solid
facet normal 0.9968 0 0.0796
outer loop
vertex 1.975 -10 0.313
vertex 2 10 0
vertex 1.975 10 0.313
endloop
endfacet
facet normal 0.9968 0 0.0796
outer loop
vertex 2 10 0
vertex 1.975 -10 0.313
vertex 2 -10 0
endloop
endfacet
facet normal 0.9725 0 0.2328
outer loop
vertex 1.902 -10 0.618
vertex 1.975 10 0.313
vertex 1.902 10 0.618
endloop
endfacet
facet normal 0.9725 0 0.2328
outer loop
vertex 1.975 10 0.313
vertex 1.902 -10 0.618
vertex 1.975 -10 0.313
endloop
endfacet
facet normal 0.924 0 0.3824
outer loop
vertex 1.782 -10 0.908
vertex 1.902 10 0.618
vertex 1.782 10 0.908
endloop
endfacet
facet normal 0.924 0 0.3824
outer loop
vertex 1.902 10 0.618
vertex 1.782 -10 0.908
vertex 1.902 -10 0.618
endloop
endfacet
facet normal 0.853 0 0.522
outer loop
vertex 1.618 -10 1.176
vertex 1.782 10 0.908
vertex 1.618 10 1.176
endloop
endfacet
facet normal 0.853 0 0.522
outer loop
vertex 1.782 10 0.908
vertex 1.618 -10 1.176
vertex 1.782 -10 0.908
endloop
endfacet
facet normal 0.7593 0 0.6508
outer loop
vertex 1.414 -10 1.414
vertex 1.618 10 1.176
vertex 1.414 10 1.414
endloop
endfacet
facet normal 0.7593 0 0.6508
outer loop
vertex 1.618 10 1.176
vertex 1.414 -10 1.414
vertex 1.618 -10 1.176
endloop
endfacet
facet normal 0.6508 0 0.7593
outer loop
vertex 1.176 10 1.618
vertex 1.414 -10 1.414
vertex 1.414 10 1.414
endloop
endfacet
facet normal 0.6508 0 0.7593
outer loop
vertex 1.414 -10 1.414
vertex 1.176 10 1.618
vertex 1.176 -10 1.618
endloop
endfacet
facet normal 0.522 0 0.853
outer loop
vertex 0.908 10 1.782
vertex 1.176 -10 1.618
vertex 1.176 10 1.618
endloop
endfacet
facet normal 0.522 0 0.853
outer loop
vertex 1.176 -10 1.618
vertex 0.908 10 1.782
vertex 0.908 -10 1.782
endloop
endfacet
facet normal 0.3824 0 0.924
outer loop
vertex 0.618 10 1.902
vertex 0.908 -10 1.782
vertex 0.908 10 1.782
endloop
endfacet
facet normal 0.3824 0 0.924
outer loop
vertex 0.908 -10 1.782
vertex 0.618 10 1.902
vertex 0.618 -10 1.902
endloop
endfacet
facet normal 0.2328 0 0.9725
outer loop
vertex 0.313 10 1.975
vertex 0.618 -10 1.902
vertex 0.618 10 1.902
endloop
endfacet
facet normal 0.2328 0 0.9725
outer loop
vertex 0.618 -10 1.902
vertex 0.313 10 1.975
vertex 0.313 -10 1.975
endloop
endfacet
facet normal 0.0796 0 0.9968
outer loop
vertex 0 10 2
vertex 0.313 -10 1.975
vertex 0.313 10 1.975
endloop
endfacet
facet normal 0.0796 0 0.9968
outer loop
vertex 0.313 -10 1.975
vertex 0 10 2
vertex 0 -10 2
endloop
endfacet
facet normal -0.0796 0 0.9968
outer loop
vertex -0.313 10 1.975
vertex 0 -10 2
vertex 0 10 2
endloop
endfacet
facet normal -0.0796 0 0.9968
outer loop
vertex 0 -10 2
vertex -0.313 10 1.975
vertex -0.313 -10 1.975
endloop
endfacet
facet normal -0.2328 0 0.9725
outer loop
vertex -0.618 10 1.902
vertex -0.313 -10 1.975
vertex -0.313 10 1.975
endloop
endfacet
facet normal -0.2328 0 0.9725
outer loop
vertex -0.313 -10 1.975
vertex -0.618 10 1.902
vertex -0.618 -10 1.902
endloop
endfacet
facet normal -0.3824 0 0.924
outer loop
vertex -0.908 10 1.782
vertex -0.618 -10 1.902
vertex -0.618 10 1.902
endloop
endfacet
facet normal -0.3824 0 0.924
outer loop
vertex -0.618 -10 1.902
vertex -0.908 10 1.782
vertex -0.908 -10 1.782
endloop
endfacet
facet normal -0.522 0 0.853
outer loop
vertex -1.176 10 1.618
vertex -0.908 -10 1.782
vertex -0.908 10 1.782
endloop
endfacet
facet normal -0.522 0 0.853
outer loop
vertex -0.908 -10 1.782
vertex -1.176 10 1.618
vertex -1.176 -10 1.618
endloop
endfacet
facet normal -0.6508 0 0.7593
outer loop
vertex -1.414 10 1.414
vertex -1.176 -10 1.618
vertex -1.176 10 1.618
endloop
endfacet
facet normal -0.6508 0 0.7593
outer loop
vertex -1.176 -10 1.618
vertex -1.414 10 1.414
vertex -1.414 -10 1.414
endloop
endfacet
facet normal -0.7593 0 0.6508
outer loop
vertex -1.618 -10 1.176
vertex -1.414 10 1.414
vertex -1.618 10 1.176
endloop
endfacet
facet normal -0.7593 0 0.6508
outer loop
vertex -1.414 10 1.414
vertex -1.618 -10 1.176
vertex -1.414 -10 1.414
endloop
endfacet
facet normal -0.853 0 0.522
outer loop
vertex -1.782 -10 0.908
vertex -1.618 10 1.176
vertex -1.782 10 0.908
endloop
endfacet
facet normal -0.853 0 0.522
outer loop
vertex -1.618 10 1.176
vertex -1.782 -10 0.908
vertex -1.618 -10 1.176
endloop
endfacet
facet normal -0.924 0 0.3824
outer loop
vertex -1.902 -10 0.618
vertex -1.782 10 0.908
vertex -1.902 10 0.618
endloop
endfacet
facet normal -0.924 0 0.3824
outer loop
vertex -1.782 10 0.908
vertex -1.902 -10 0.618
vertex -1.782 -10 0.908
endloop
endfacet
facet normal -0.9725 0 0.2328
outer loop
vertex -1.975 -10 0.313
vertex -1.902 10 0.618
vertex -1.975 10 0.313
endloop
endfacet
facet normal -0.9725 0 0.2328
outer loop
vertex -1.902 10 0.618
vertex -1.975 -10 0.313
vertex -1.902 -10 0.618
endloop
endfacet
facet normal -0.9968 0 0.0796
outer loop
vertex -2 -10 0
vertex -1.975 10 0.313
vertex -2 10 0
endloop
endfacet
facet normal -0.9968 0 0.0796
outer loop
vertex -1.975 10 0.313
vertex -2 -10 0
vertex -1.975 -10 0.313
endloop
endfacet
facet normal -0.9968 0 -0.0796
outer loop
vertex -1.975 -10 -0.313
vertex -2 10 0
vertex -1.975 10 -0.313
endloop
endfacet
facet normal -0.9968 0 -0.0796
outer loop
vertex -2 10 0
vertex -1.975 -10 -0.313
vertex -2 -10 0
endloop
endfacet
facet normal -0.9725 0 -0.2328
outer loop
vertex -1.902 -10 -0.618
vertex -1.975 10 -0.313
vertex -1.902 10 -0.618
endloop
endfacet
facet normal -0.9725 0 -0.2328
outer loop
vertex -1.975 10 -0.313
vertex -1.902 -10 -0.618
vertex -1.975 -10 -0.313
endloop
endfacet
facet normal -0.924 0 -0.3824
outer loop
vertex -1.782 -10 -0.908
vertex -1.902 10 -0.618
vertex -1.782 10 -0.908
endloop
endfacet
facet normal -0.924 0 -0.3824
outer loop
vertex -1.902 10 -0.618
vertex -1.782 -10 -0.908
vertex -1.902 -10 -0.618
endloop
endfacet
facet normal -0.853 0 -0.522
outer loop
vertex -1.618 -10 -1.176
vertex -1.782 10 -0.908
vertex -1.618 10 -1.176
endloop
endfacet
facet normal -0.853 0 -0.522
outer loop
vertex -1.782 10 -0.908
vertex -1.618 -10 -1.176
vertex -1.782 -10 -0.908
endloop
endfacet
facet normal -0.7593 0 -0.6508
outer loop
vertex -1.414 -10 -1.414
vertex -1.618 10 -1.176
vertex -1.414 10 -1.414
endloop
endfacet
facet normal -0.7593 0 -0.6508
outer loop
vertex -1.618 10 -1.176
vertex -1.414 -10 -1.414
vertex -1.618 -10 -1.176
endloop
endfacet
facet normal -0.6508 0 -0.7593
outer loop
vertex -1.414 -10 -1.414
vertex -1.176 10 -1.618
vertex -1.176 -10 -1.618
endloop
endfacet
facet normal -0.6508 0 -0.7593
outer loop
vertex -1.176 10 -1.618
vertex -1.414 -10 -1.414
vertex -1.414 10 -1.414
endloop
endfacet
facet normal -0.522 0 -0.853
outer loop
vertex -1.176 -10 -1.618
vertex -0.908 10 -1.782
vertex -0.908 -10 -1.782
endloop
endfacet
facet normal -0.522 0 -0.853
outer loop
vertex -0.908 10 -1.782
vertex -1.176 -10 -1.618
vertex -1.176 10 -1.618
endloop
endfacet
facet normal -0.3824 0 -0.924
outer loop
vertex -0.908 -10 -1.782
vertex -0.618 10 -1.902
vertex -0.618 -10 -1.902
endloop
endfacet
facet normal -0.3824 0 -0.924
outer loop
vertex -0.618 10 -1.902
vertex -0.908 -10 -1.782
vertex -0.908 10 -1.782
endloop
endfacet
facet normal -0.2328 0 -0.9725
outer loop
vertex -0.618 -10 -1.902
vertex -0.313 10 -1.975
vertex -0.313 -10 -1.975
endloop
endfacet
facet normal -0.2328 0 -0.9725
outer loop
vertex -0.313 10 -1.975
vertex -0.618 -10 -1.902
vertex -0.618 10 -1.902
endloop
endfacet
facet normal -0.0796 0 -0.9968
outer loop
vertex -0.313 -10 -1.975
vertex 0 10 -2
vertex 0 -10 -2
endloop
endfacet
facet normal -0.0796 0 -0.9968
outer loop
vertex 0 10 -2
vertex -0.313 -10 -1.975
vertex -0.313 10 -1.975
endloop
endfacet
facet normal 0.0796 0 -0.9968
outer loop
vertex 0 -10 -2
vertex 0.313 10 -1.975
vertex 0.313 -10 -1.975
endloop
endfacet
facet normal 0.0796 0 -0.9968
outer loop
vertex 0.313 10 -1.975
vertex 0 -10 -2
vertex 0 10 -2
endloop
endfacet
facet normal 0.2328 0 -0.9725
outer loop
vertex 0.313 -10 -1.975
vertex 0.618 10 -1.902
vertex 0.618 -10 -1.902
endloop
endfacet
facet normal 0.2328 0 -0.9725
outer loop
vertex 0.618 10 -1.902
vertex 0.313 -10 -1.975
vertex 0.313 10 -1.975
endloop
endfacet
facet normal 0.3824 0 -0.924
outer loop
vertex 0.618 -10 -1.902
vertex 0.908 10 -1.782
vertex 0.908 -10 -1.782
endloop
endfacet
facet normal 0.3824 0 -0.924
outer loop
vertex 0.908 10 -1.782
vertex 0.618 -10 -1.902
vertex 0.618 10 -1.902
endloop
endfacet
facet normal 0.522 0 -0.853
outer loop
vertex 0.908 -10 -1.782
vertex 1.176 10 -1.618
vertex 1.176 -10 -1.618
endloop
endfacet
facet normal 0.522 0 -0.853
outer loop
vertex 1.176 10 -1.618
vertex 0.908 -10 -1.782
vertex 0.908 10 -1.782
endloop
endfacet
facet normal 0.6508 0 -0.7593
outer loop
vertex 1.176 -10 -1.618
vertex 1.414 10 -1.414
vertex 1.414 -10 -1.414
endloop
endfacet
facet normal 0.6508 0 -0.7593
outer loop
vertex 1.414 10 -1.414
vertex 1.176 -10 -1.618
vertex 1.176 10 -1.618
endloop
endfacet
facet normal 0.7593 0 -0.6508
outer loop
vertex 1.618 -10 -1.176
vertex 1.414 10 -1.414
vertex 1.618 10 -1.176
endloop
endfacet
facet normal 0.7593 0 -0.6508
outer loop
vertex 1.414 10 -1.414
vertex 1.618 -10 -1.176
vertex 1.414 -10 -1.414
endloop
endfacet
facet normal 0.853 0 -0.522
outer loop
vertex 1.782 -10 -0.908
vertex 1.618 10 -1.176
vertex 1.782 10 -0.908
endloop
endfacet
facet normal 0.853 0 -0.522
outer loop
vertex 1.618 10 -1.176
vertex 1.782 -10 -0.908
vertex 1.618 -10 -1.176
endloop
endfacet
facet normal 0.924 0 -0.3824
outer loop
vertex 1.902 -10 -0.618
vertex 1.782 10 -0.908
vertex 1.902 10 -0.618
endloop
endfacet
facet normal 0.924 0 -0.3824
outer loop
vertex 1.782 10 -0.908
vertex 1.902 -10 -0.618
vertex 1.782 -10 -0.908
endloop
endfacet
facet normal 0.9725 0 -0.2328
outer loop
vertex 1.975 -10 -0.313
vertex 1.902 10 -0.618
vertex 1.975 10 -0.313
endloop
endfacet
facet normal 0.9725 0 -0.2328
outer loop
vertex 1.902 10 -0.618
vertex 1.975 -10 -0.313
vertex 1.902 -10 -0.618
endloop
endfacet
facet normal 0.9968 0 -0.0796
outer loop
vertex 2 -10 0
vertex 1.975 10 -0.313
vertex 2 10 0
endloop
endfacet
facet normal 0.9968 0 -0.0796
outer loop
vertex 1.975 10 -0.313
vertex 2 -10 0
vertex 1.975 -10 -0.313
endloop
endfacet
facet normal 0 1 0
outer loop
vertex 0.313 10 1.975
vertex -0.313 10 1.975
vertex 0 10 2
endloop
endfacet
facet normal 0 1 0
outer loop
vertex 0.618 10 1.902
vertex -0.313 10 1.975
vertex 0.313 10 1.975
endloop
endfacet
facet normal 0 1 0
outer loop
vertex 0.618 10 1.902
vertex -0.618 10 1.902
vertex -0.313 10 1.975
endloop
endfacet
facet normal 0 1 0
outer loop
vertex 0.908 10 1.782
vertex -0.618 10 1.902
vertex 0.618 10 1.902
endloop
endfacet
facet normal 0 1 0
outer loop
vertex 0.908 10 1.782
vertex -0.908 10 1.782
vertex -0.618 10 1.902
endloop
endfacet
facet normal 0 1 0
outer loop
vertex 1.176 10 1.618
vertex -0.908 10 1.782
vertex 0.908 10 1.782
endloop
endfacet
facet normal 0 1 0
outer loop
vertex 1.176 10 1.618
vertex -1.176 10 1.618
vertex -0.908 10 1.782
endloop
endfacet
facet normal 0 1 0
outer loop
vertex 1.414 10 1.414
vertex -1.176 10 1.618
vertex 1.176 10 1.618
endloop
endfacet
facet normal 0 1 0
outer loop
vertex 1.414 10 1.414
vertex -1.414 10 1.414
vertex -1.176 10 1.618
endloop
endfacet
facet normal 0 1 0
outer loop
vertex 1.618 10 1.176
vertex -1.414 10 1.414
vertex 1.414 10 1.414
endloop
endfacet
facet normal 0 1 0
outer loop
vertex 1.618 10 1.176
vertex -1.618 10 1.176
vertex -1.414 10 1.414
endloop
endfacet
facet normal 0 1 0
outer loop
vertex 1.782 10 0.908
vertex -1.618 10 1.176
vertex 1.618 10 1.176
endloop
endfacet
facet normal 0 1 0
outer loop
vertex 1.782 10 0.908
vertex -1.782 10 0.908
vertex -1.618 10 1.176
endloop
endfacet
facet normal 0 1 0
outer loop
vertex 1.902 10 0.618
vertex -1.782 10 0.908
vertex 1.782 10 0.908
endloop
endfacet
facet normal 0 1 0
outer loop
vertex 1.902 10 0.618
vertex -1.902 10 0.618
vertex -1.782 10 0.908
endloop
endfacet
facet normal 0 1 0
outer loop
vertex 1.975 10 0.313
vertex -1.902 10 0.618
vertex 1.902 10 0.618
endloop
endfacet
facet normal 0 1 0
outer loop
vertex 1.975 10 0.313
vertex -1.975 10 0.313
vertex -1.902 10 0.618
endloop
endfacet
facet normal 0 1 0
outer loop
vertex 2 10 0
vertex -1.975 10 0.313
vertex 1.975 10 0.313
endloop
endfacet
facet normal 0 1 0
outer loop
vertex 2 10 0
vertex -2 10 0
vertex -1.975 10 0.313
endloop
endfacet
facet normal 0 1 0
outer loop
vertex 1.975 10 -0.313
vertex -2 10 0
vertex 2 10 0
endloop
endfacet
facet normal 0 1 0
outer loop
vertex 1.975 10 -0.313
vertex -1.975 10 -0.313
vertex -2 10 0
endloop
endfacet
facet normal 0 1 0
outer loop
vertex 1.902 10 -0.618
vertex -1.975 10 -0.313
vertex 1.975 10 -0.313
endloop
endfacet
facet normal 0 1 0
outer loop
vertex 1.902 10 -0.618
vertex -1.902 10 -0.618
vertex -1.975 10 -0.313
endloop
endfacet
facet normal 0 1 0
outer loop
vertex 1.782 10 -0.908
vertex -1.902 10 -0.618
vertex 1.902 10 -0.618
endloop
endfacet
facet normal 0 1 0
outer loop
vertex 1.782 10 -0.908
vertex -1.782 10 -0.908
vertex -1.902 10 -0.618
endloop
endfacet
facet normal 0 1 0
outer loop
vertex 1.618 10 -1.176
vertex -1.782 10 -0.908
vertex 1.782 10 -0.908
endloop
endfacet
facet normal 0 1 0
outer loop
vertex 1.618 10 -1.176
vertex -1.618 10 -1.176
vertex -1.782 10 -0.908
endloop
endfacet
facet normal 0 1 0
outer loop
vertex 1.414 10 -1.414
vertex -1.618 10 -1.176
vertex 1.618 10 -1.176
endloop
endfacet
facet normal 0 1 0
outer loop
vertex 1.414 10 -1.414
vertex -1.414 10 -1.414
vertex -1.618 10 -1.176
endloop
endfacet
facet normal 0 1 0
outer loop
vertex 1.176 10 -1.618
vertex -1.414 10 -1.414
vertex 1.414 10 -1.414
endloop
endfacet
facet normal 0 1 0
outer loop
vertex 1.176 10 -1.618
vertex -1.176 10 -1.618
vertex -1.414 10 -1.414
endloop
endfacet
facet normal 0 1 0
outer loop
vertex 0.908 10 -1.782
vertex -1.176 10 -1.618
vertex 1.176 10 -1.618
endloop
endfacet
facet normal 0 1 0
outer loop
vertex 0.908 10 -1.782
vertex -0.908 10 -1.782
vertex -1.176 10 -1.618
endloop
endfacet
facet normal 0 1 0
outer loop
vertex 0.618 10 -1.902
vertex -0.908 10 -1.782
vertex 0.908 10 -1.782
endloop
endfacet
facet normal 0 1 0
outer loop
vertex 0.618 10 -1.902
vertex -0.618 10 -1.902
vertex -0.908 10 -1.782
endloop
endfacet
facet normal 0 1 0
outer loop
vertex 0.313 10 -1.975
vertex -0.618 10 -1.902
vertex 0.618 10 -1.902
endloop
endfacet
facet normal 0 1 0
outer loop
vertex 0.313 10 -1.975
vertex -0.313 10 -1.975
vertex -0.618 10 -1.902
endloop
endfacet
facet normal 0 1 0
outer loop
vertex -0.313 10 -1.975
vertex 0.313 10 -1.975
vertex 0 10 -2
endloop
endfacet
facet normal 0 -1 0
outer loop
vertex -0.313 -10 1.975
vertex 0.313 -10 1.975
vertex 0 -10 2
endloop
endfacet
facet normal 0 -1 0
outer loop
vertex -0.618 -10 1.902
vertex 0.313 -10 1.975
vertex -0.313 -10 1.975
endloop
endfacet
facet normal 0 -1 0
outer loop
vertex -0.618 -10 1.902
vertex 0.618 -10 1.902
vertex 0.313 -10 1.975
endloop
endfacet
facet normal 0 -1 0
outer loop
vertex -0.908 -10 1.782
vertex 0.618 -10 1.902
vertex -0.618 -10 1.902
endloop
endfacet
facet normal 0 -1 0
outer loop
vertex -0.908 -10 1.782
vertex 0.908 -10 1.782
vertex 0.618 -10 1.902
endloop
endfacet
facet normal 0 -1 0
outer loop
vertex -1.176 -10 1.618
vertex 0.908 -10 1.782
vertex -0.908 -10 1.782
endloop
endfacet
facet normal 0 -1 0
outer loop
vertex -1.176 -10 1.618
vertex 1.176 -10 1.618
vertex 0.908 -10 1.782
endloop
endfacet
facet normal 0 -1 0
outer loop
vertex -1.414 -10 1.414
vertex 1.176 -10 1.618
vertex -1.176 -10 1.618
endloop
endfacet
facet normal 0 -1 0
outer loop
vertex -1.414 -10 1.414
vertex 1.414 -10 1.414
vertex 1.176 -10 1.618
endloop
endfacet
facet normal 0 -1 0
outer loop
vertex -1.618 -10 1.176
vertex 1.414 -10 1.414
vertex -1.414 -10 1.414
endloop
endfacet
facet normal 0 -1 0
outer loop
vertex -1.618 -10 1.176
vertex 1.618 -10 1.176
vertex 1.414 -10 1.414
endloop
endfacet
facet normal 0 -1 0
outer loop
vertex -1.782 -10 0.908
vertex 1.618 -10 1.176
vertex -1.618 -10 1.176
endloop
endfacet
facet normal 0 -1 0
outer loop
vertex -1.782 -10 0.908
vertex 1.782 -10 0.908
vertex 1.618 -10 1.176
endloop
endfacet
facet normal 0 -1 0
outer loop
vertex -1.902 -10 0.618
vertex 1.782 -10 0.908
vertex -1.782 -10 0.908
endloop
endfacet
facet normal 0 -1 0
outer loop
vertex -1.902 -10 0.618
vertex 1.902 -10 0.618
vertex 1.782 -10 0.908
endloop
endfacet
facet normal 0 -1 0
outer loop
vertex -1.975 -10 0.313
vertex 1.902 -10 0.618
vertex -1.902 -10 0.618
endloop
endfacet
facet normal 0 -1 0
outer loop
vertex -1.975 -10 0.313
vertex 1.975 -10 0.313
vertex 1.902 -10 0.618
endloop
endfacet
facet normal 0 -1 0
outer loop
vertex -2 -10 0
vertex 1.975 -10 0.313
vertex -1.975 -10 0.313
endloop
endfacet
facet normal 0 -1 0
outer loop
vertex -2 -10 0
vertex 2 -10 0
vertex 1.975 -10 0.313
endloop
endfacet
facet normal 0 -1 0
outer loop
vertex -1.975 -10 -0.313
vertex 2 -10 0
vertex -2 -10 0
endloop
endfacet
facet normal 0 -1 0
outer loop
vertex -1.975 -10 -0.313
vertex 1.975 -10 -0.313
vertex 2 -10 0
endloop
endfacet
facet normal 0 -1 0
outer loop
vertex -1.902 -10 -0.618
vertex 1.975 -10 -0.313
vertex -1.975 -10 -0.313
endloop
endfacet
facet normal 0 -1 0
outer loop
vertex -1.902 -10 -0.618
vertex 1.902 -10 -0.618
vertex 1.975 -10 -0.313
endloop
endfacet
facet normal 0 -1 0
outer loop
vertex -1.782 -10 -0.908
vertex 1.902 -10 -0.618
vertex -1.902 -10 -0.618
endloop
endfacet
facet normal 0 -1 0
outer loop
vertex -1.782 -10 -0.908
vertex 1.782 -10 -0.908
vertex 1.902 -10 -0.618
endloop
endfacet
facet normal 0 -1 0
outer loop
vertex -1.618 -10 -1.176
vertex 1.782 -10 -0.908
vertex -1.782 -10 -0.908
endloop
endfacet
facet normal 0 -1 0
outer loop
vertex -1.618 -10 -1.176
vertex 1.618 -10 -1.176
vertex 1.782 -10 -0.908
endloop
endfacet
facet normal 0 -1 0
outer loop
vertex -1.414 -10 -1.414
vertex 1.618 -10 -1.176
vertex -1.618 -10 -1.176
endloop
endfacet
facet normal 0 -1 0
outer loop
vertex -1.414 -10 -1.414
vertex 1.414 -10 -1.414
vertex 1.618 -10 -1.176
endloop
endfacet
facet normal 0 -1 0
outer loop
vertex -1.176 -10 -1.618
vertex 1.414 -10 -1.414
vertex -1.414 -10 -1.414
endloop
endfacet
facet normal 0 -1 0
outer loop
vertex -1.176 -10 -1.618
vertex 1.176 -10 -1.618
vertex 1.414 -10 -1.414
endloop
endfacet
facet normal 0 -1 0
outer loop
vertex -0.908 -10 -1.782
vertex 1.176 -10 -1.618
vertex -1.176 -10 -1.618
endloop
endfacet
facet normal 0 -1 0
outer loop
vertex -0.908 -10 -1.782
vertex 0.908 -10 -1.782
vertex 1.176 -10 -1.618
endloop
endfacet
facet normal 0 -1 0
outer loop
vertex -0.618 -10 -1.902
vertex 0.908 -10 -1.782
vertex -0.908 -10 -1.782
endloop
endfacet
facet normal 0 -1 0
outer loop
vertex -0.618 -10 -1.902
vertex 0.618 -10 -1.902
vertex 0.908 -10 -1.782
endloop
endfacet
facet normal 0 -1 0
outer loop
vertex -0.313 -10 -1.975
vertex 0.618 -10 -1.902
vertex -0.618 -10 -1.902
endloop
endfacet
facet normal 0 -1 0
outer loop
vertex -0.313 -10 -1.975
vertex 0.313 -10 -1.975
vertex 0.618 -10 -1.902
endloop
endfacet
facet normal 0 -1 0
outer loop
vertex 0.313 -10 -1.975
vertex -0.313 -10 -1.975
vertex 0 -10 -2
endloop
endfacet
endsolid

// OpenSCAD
difference() {
	// start objects
	cylinder (h = 12, r=5, center = true, $fn=100);
        // first object that will subtracted
	#rotate ([90,0,0]) cylinder (h = 15, r=1, center = true, $fn=100);
        // second object that will be subtracted
	#rotate ([0,90,0]) cylinder (h = 15, r=3, center = true, $fn=100);
    
    		!rotate([90, 0, 0]) {
			#cylinder(r = 2, h = 20, center = true, $fn = 40);
		}
	%rotate ([0,90,0]) cylinder (h = 15, r=3, center = true, $fn=100);

}
